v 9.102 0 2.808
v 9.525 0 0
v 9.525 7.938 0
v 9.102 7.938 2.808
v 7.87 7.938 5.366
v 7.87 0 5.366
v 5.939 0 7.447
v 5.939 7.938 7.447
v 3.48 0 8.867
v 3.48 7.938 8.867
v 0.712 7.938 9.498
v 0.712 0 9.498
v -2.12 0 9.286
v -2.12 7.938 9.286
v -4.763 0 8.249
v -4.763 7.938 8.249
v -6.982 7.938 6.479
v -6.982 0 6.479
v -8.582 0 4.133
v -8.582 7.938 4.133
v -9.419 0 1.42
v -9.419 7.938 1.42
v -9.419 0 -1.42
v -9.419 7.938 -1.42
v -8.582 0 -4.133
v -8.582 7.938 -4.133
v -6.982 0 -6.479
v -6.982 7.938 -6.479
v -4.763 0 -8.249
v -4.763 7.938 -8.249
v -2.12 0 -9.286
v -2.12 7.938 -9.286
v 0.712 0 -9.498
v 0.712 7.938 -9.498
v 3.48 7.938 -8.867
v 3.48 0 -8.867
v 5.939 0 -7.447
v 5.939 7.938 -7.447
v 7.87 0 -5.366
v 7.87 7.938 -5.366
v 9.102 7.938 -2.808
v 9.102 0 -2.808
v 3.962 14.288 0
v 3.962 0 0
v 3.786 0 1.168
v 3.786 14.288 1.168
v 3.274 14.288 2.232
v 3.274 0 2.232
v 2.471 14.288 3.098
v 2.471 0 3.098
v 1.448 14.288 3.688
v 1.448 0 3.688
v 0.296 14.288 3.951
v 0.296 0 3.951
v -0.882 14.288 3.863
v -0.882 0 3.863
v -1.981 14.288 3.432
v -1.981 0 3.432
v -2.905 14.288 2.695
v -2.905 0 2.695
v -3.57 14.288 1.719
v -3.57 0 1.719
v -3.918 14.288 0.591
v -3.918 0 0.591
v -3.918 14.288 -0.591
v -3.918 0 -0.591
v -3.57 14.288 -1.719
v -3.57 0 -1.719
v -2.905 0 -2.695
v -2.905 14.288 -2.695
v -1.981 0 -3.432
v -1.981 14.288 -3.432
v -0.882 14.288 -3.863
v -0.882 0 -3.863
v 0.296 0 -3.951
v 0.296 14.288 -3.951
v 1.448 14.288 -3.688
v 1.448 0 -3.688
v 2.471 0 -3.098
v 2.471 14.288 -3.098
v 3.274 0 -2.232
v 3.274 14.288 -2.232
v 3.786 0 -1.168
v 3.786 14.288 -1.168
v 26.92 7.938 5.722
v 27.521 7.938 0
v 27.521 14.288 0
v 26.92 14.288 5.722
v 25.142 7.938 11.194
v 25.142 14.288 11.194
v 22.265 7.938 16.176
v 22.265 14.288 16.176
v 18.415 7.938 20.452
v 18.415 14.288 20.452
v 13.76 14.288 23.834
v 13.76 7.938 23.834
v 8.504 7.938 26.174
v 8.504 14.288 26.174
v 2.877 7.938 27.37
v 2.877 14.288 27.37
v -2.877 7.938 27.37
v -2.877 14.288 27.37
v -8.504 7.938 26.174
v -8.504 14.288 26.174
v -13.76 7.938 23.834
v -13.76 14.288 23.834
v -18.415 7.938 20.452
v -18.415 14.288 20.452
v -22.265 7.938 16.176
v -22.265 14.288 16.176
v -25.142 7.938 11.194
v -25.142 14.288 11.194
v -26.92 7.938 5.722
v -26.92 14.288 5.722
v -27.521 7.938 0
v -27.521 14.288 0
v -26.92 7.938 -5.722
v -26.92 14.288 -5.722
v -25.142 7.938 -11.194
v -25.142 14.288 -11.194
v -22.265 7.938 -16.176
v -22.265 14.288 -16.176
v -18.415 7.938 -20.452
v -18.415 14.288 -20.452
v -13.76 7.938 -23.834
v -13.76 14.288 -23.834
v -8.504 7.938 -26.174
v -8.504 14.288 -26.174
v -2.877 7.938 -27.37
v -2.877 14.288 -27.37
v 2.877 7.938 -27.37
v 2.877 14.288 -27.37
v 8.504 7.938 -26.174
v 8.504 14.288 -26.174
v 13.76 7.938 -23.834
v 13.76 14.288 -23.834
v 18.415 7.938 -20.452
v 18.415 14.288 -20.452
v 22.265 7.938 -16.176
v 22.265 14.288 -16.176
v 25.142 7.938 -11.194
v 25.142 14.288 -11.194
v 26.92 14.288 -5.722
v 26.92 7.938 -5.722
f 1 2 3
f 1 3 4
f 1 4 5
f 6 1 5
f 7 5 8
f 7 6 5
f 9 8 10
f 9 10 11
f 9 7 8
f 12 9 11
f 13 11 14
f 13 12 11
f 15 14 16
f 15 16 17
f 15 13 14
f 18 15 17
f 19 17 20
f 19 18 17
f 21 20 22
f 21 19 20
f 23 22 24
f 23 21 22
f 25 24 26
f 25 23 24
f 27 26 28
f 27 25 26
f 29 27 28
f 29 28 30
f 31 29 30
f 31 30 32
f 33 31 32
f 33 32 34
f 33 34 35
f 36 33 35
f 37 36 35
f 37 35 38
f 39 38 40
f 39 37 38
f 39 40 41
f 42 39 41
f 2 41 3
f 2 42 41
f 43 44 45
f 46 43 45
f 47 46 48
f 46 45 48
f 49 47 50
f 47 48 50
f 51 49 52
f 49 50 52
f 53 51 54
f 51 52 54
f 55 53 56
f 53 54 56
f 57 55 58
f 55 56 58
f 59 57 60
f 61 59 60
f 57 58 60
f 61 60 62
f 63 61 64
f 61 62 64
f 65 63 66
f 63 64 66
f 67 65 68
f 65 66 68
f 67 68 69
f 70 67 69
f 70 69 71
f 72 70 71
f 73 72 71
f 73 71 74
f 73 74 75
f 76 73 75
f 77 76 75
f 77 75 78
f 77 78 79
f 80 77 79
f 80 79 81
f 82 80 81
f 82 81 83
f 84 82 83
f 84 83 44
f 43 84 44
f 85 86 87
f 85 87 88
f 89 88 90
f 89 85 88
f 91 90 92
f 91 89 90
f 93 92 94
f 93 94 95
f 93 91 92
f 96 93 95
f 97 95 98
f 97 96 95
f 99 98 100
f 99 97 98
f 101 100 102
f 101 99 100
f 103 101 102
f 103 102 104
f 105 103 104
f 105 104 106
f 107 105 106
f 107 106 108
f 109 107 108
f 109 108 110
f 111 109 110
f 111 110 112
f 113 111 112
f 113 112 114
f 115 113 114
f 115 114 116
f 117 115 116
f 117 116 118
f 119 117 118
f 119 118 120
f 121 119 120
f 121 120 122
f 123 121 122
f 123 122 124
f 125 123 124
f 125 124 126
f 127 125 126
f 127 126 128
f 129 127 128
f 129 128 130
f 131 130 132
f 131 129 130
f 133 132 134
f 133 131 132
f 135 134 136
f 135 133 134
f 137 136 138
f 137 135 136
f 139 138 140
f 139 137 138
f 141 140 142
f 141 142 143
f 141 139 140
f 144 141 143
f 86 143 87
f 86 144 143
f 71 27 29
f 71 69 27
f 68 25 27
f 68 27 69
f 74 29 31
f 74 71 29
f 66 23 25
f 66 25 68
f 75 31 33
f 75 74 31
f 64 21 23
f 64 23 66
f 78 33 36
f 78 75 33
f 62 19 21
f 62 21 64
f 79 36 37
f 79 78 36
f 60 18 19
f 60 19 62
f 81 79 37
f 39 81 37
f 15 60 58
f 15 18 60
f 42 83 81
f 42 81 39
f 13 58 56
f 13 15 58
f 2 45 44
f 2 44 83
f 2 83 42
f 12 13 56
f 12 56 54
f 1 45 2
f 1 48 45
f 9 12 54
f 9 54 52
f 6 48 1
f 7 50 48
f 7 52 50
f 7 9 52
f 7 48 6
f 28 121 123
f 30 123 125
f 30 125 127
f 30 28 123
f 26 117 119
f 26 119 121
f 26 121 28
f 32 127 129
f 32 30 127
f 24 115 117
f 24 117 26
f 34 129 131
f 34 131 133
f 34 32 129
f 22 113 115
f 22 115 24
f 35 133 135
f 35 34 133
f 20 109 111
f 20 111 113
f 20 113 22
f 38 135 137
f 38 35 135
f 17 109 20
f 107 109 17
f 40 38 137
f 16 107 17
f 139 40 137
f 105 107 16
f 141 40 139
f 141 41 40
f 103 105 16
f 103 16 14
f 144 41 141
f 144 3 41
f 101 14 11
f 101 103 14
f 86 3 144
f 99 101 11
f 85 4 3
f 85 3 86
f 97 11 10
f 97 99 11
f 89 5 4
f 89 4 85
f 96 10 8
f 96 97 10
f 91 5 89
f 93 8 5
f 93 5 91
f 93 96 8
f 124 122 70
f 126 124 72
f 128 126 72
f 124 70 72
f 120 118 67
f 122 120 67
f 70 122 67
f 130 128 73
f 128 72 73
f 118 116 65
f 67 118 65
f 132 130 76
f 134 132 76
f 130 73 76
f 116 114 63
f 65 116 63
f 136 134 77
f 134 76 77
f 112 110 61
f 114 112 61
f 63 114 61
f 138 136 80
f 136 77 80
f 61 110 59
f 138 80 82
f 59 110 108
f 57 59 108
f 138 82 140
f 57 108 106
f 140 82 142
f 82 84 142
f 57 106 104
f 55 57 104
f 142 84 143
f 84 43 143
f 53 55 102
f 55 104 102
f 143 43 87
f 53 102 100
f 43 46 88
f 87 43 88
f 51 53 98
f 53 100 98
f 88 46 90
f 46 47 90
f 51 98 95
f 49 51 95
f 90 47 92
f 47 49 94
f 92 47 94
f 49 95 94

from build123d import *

# Parameters (mm, degrees)
F0_R     = 27.5209
F1_DEPTH = 14.2875
F2_R     = 27.5209
F2_R_2   = 9.525
F3_DEPTH = 7.9375
F4_R     = 3.9624
F5_DEPTH = 14.2885


with BuildPart() as f1:
    # F0 (on Front) → F1 (new body)
    with BuildSketch(Plane.XZ):
        Circle(F0_R)
    extrude(amount=-F1_DEPTH)

    # F2 (on face) → F3 (cut)
    with BuildSketch(Plane.XZ):
        Circle(F2_R)
        Circle(F2_R_2, mode=Mode.SUBTRACT)
    extrude(amount=-F3_DEPTH, mode=Mode.SUBTRACT)

    # F4 (on face) → F5 (cut, through all)
    with BuildSketch(Plane.XZ):
        Circle(F4_R)
    extrude(amount=-F5_DEPTH, mode=Mode.SUBTRACT)


solid = f1.part
